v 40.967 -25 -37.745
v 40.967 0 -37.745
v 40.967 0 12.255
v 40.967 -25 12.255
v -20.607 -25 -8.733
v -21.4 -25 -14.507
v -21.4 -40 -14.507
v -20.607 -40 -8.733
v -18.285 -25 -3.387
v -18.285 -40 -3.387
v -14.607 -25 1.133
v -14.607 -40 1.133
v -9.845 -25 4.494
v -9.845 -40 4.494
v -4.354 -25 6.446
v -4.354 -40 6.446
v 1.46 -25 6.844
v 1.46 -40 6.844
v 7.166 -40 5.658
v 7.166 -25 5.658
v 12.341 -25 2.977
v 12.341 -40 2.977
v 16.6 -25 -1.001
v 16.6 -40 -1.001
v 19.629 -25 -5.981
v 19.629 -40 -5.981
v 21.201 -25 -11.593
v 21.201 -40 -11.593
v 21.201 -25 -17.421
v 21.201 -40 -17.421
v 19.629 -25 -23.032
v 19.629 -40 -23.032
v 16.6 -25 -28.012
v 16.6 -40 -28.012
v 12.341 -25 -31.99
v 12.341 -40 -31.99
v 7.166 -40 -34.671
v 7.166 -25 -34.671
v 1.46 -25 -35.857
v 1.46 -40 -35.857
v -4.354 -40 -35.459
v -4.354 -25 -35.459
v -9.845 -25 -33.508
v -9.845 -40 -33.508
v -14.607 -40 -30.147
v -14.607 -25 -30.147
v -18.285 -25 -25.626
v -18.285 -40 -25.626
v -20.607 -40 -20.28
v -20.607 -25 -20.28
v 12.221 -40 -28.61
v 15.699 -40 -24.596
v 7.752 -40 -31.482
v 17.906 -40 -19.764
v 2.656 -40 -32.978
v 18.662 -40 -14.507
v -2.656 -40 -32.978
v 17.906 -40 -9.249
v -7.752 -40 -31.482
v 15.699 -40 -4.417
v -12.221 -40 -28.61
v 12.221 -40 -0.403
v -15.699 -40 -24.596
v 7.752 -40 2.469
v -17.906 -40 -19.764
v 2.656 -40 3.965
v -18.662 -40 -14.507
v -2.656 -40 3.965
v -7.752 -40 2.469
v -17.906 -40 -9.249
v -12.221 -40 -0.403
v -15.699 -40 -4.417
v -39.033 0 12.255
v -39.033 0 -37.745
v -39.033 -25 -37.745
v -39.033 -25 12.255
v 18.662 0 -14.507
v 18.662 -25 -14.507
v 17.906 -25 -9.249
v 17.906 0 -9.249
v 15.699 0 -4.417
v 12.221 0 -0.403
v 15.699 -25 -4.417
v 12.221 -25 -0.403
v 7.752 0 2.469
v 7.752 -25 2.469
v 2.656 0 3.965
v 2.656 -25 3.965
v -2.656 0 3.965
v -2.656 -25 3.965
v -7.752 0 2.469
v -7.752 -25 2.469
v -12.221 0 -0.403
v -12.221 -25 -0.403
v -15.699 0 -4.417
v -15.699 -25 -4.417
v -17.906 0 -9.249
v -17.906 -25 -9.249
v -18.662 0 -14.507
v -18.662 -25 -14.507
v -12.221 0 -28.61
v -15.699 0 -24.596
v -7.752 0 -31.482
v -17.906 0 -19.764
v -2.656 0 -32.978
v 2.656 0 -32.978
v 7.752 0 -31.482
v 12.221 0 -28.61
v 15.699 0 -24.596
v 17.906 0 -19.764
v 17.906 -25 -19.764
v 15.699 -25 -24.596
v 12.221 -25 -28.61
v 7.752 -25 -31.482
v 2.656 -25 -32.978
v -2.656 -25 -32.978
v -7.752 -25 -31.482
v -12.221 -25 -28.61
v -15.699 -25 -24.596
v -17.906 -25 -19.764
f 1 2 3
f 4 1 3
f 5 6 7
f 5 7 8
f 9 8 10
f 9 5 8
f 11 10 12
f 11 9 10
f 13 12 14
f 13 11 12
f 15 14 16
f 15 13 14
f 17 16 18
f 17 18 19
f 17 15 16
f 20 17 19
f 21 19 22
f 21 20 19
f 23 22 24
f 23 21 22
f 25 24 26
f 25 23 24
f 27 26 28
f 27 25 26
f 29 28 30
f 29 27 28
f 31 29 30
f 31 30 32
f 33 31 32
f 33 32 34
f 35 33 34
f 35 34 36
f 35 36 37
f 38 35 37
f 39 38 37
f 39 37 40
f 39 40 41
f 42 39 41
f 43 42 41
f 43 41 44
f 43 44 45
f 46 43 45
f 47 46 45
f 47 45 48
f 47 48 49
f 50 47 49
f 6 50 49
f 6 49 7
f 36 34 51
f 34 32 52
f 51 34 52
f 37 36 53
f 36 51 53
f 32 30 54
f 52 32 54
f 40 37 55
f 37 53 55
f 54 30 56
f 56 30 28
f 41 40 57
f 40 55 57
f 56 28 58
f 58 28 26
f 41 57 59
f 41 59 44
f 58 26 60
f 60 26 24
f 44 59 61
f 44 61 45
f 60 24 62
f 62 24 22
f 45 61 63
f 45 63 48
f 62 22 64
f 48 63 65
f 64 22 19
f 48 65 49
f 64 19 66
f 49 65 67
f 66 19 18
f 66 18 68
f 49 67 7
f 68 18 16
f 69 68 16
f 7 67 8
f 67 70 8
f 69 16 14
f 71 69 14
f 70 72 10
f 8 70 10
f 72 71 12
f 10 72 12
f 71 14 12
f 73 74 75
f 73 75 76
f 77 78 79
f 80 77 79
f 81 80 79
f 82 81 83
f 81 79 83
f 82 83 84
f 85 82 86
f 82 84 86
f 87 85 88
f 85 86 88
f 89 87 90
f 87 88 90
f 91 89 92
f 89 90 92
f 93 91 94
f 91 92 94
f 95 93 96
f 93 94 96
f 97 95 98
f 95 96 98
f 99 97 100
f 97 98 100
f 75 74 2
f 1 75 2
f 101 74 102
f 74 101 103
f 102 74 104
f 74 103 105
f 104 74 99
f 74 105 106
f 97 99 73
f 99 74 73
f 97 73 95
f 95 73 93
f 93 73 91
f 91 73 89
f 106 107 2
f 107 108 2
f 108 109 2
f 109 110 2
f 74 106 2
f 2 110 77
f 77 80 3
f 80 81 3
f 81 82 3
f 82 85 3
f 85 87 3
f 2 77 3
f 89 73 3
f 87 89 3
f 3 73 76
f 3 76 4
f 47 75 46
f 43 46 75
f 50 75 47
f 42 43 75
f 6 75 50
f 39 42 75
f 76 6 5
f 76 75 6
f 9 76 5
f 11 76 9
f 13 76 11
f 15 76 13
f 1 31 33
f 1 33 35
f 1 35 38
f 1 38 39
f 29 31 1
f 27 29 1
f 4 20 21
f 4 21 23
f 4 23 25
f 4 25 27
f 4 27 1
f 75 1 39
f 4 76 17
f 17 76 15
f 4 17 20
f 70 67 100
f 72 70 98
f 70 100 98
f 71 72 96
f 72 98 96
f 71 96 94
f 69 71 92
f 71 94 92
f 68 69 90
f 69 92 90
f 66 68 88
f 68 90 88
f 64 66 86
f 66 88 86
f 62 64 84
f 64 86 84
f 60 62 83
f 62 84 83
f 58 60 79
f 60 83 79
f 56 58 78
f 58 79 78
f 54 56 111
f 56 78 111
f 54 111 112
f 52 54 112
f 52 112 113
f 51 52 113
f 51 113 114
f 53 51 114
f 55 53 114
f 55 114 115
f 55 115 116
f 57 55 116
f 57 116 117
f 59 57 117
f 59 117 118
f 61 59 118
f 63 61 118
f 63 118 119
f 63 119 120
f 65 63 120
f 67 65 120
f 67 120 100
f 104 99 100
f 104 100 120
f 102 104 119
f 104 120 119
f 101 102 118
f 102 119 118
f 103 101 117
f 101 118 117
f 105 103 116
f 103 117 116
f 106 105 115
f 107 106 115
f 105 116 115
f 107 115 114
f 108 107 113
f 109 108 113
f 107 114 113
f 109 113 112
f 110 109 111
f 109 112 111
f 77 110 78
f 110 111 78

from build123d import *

# Parameters (mm, degrees)
F0_W     = 80
F0_H     = 50
F1_DEPTH = 25
F2_R     = 18.6615462825
F3_DEPTH = 45.6
F4_R     = 21.4002075556
F4_R_2   = 18.6615462825
F5_DEPTH = 40


with BuildPart() as f1:
    # F0 (on Front) → F1 (new body)
    with BuildSketch(Plane.XZ):
        with Locations((0.9671058506, -12.7448502543)):
            Rectangle(F0_W, F0_H)
    extrude(amount=F1_DEPTH)

    # F2 (on Front) → F3 (cut, symmetric)
    with BuildSketch(Plane.XZ):
        with Locations((0, -14.5065793768)):
            Circle(F2_R)
    extrude(amount=F3_DEPTH, both=True, mode=Mode.SUBTRACT)

    # F4 (on face) → F5 (join)
    with BuildSketch(Plane(origin=(0, 0, 0), x_dir=(-1, 0, 0), z_dir=(0, 1, 0))):
        with Locations((0, -14.5065793768)):
            Circle(F4_R)
        with Locations((0, -14.5065793768)):
            Circle(F4_R_2, mode=Mode.SUBTRACT)
    extrude(amount=-F5_DEPTH)


solid = f1.part
